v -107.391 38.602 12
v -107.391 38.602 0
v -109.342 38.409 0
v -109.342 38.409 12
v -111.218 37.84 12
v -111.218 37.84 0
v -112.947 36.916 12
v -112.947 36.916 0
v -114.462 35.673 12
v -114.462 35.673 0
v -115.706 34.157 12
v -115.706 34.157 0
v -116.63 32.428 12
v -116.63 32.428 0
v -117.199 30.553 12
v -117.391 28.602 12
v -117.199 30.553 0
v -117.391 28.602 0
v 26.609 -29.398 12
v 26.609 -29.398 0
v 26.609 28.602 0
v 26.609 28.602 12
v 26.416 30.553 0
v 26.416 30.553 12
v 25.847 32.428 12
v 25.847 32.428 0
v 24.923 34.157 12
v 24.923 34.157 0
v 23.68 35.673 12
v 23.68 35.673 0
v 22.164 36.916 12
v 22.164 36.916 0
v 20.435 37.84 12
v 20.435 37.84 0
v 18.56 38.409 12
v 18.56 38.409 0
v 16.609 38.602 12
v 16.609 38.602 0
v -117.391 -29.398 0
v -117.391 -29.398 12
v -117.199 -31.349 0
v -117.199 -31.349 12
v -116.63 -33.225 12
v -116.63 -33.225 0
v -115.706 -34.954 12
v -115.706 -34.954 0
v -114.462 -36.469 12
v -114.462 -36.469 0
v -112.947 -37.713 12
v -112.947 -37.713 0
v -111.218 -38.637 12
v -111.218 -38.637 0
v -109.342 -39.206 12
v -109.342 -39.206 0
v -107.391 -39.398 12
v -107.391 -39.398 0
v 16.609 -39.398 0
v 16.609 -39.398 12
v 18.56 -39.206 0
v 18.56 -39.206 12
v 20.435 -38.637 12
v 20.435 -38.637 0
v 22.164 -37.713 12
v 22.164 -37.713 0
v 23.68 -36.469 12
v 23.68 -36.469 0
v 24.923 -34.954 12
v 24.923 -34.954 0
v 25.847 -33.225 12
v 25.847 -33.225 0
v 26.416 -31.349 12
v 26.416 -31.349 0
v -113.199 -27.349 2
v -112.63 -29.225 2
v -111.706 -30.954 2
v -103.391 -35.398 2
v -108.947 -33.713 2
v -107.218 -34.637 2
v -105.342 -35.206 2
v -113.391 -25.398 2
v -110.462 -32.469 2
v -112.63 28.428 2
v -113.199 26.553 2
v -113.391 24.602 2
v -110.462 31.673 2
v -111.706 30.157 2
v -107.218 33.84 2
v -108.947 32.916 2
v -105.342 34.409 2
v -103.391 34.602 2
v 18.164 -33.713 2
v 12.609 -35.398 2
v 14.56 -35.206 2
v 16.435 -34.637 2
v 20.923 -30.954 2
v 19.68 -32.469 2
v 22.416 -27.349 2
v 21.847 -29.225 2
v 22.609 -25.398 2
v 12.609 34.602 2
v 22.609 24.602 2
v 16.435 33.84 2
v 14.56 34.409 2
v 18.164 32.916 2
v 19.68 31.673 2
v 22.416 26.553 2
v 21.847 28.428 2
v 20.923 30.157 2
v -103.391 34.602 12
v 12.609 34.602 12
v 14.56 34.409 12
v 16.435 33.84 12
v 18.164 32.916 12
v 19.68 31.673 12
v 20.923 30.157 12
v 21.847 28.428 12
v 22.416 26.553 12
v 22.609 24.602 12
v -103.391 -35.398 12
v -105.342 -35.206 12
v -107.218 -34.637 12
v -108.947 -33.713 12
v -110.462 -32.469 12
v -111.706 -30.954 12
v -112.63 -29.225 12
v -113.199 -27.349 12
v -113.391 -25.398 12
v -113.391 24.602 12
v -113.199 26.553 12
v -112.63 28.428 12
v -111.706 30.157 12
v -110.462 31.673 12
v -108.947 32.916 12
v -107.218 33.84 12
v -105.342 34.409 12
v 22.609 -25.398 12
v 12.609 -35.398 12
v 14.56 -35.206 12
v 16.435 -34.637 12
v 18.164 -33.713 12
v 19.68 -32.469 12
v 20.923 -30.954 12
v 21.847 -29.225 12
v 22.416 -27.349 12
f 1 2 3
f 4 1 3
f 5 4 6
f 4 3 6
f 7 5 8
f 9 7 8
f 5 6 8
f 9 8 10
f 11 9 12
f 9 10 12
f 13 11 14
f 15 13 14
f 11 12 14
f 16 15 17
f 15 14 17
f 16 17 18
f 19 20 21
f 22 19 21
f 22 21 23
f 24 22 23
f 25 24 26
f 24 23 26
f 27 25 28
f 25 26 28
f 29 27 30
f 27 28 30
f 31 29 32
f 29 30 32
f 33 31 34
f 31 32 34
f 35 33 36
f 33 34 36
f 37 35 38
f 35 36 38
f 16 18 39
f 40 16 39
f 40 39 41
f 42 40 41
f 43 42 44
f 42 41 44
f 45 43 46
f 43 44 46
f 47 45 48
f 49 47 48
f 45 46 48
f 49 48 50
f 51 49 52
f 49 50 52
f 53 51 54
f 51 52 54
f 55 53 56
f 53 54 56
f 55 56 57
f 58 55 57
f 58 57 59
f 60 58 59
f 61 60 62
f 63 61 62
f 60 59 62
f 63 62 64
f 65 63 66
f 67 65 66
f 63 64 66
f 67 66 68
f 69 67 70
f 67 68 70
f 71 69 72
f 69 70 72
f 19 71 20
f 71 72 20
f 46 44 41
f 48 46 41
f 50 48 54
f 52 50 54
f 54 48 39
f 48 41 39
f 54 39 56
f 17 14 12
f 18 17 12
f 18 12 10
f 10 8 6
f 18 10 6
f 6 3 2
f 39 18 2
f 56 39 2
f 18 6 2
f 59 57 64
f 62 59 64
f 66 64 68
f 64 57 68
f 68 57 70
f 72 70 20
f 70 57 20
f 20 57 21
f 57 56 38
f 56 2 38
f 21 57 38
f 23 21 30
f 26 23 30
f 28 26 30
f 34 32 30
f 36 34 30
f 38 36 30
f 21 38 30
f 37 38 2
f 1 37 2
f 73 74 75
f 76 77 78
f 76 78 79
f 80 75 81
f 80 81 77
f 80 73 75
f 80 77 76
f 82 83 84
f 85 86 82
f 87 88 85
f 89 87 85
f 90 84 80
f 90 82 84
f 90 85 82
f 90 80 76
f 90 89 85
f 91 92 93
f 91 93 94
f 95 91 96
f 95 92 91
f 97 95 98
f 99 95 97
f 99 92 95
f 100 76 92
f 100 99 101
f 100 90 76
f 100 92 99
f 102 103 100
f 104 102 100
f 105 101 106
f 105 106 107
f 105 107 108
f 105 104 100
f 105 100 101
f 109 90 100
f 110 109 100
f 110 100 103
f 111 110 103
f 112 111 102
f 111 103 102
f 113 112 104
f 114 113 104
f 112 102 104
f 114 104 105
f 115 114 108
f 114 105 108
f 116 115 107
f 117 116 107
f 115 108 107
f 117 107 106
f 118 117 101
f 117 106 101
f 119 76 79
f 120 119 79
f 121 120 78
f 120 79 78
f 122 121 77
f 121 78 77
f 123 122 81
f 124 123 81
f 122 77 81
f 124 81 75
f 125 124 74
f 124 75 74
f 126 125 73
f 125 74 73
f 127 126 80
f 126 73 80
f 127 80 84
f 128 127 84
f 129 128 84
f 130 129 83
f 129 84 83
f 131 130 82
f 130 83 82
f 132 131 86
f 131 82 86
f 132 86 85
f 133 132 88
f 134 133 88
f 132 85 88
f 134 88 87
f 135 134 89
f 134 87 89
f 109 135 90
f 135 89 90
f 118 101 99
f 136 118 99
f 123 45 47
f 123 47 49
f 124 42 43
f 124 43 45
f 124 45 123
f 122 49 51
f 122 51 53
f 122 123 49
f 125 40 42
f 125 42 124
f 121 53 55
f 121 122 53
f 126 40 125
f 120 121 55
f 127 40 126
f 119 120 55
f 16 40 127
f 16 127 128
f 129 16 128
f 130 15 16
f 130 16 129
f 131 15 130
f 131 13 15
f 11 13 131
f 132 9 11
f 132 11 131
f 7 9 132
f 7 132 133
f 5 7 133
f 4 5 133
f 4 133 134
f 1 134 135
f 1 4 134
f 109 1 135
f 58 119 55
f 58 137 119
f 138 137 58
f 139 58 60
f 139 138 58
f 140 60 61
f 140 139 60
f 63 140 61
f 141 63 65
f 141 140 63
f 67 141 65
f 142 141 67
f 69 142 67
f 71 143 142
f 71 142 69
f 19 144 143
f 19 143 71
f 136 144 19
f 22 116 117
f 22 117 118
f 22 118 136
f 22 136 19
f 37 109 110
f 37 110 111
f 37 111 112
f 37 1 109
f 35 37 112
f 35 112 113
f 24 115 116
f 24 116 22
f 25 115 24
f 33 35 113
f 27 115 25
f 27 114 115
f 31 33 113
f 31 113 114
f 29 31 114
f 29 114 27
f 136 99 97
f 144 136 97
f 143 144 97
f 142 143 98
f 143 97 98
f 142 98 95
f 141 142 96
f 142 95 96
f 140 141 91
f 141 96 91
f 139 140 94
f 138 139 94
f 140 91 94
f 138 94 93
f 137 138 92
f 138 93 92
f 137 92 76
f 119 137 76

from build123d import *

# Parameters (mm, degrees)
F1_DEPTH = 2
F2_DEPTH = 12


with BuildPart() as f1:
    # F0 (on Top) → F1 (new body)
    with BuildSketch(Plane.XY):
        with BuildLine():
            ThreePointArc((22.608614, 24.601607), (19.679682, 31.672675), (12.608614, 34.601607))
            Line((12.608614, 34.601607), (-103.391386, 34.601607))
            ThreePointArc((-103.391386, 34.601607), (-110.462453, 31.672675), (-113.391386, 24.601607))
            Line((-113.391386, 24.601607), (-113.391386, -25.398393))
            ThreePointArc((-113.391386, -25.398393), (-110.462453, -32.469461), (-103.391386, -35.398393))
            Line((-103.391386, -35.398393), (12.608614, -35.398393))
            ThreePointArc((12.608614, -35.398393), (19.679682, -32.469461), (22.608614, -25.398393))
            Line((22.608614, -25.398393), (22.608614, 24.601607))
        make_face()
    extrude(amount=F1_DEPTH)

    # F0 (on Top) → F2 (join)
    with BuildSketch(Plane.XY):
        with BuildLine():
            ThreePointArc((26.608614, 28.601607), (23.679682, 35.672675), (16.608614, 38.601607))
            Line((16.608614, 38.601607), (-107.391386, 38.601607))
            ThreePointArc((-107.391386, 38.601607), (-114.462453, 35.672675), (-117.391386, 28.601607))
            Line((-117.391386, 28.601607), (-117.391386, -29.398393))
            ThreePointArc((-117.391386, -29.398393), (-114.462453, -36.469461), (-107.391386, -39.398393))
            Line((-107.391386, -39.398393), (16.608614, -39.398393))
            ThreePointArc((16.608614, -39.398393), (23.679682, -36.469461), (26.608614, -29.398393))
            Line((26.608614, -29.398393), (26.608614, 28.601607))
        make_face()
        with BuildLine():
            Line((-103.391386, 34.601607), (12.608614, 34.601607))
            ThreePointArc((12.608614, 34.601607), (19.679682, 31.672675), (22.608614, 24.601607))
            Line((22.608614, 24.601607), (22.608614, -25.398393))
            ThreePointArc((22.608614, -25.398393), (19.679682, -32.469461), (12.608614, -35.398393))
            Line((12.608614, -35.398393), (-103.391386, -35.398393))
            ThreePointArc((-103.391386, -35.398393), (-110.462453, -32.469461), (-113.391386, -25.398393))
            Line((-113.391386, -25.398393), (-113.391386, 24.601607))
            ThreePointArc((-113.391386, 24.601607), (-110.462453, 31.672675), (-103.391386, 34.601607))
        make_face(mode=Mode.SUBTRACT)
    extrude(amount=F2_DEPTH)


solid = f1.part
